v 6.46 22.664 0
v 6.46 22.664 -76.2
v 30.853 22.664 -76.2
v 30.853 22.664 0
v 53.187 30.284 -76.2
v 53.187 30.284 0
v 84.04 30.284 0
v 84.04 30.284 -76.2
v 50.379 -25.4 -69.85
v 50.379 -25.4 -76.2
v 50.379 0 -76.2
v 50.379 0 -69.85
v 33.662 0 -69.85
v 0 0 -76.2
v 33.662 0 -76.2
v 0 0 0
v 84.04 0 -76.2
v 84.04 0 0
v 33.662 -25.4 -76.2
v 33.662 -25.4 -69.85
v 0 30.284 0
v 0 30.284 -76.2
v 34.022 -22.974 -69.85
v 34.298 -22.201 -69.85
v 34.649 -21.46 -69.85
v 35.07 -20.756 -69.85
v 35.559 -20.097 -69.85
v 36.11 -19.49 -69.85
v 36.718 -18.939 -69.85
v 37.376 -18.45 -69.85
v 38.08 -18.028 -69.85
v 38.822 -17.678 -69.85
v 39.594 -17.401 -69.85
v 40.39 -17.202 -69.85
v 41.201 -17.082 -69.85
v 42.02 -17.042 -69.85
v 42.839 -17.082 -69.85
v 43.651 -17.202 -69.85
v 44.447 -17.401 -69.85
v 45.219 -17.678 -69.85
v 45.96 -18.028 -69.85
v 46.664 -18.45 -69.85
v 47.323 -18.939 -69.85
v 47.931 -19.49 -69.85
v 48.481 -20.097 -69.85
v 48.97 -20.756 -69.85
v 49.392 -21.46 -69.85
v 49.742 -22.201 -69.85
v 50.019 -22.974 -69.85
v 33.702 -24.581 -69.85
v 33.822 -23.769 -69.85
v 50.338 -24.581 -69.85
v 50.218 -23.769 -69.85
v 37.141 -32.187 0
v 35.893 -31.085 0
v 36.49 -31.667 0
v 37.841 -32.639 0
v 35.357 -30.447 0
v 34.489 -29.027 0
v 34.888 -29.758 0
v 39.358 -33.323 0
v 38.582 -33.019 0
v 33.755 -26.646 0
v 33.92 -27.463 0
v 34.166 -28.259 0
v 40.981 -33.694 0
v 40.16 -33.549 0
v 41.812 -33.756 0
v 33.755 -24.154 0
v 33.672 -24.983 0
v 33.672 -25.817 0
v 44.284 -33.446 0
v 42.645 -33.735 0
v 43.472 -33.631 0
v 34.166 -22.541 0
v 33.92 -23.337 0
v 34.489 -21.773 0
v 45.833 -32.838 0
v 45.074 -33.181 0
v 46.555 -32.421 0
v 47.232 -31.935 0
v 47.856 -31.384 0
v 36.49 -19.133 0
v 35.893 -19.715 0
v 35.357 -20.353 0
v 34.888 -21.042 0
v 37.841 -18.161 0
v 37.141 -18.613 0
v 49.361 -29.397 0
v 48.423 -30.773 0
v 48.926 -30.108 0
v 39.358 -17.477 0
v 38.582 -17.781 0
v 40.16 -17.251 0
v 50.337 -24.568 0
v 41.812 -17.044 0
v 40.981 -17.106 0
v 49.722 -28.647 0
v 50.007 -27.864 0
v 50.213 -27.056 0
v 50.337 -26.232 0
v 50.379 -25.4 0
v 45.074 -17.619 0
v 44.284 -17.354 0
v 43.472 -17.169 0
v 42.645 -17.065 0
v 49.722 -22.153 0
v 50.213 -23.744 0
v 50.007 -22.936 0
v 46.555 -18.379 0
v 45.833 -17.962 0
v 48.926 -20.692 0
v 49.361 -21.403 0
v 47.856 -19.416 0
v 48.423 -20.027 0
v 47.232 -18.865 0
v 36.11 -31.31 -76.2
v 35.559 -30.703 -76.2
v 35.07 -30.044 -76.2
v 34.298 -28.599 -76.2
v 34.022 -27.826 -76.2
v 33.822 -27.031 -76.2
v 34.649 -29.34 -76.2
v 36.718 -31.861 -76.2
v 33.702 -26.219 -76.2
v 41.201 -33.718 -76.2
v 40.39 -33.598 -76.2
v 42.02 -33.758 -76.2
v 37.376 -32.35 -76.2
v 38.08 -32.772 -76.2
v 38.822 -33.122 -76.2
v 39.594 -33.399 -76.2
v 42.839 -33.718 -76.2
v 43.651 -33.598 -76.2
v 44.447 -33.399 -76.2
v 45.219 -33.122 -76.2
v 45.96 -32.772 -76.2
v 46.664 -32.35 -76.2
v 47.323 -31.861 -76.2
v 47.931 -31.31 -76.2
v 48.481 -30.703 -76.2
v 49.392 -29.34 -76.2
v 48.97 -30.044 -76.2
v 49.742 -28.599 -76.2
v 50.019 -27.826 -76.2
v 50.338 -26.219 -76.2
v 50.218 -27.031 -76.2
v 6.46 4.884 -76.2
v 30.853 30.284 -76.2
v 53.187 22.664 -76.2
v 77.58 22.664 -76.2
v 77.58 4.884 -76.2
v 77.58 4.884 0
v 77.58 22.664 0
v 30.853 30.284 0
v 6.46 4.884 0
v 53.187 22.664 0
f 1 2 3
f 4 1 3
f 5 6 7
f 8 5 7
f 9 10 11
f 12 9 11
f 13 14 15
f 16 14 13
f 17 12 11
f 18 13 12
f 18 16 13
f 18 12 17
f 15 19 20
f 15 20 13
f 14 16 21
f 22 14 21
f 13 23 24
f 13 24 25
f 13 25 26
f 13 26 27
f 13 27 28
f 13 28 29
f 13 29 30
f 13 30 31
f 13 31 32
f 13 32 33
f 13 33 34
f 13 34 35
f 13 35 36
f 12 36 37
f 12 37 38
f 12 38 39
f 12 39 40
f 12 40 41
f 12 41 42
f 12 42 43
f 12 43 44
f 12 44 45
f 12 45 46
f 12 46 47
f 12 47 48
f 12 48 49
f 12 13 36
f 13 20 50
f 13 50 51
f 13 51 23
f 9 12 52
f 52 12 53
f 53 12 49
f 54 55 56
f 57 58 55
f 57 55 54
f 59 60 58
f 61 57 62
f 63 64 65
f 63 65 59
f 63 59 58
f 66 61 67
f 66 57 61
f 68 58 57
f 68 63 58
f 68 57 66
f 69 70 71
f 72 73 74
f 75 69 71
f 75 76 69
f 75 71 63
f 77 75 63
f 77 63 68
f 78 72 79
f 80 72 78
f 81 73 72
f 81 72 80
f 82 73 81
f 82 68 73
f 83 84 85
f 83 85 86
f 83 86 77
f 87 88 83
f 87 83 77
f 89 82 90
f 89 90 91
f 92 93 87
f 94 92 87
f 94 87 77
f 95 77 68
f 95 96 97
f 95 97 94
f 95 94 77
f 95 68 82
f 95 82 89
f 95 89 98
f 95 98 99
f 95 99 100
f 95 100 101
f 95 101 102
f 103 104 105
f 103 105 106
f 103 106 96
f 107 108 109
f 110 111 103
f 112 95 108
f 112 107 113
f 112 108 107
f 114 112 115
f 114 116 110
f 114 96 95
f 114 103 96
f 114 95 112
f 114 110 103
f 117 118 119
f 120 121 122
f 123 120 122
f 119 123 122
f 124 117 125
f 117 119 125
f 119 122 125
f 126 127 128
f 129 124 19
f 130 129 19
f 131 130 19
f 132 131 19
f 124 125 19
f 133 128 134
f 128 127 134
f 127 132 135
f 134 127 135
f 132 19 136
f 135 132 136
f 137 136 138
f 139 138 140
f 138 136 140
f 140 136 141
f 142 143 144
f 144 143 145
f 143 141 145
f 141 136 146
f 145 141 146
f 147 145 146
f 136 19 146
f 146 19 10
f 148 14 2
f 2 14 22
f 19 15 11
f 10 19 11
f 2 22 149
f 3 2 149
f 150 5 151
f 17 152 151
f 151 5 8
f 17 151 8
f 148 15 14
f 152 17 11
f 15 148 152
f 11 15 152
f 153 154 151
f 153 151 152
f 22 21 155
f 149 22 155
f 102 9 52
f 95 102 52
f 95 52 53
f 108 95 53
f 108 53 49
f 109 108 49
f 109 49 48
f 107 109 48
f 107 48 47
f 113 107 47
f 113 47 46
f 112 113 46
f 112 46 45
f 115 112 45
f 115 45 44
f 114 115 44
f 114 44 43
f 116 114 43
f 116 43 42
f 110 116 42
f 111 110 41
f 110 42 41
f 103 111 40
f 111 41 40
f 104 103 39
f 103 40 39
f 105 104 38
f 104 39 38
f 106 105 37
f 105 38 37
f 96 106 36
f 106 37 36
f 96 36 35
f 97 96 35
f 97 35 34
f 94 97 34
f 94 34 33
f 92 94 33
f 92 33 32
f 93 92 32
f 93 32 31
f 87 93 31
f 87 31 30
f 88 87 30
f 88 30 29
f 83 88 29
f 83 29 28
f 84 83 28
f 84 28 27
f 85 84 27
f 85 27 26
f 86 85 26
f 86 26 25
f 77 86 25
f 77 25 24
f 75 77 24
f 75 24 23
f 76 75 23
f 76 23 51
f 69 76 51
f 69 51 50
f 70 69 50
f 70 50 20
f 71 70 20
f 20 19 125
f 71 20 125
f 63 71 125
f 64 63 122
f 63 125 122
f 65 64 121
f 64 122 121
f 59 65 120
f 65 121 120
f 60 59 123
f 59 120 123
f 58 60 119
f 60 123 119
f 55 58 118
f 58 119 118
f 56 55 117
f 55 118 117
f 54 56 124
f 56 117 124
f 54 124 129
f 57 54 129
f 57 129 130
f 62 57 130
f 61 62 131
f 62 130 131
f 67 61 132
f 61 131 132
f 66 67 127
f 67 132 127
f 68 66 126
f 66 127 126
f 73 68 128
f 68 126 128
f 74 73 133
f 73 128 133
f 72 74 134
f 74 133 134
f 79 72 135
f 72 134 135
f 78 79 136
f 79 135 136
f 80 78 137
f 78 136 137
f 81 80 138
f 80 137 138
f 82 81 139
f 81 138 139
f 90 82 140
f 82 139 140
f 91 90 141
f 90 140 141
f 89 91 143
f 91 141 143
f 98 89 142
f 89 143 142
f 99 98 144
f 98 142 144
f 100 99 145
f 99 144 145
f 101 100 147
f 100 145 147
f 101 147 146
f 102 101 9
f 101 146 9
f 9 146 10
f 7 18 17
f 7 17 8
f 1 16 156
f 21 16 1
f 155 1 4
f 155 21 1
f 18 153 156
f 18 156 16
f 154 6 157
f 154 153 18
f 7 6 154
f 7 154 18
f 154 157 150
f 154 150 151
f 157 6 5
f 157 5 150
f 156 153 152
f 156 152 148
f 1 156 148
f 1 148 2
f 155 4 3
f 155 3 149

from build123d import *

# Parameters (mm, degrees)
SKETCH1_W           = 84.040425815
SKETCH1_H           = 30.284008864
BOSS_EXTRUDE1_DEPTH = 76.2
CUT_EXTRUDE1_DEPTH  = 118.415307197
SKETCH3_W           = 16.716926531
SKETCH3_H           = 25.4
BOSS_EXTRUDE2_DEPTH = 6.35
SKETCH4_R           = 8.358463265
BOSS_EXTRUDE3_DEPTH = 76.2


with BuildPart() as part:
    # Sketch1 → Boss-Extrude1 (new body)
    with BuildSketch(Plane.XY):
        with Locations((42.020212908, 15.142004432)):
            Rectangle(SKETCH1_W, SKETCH1_H)
    extrude(amount=-BOSS_EXTRUDE1_DEPTH)

    # Sketch2 → Cut-Extrude1 (cut, through all)
    with BuildSketch(Plane.XY):
        Polygon((30.853035266, 30.284008864), (53.187390549, 30.284008864), (53.187390549, 22.664008864), (77.580212908, 22.664008864), (77.580212908, 4.884008864), (6.460212908, 4.884008864), (6.460212908, 22.664008864), (30.853035266, 22.664008864), align=None)
    extrude(amount=-CUT_EXTRUDE1_DEPTH, mode=Mode.SUBTRACT)

    # Sketch3 → Boss-Extrude2 (add)
    with BuildSketch(Plane.XY.offset(-76.2)):
        with Locations((42.020212908, -12.7)):
            Rectangle(SKETCH3_W, SKETCH3_H)
    extrude(amount=BOSS_EXTRUDE2_DEPTH)

    # Sketch4 → Boss-Extrude3 (add)
    with BuildSketch(Plane.XY.offset(-76.2)):
        with Locations((42.020212908, -25.4)):
            Circle(SKETCH4_R)
    extrude(amount=BOSS_EXTRUDE3_DEPTH)


solid = part.part
